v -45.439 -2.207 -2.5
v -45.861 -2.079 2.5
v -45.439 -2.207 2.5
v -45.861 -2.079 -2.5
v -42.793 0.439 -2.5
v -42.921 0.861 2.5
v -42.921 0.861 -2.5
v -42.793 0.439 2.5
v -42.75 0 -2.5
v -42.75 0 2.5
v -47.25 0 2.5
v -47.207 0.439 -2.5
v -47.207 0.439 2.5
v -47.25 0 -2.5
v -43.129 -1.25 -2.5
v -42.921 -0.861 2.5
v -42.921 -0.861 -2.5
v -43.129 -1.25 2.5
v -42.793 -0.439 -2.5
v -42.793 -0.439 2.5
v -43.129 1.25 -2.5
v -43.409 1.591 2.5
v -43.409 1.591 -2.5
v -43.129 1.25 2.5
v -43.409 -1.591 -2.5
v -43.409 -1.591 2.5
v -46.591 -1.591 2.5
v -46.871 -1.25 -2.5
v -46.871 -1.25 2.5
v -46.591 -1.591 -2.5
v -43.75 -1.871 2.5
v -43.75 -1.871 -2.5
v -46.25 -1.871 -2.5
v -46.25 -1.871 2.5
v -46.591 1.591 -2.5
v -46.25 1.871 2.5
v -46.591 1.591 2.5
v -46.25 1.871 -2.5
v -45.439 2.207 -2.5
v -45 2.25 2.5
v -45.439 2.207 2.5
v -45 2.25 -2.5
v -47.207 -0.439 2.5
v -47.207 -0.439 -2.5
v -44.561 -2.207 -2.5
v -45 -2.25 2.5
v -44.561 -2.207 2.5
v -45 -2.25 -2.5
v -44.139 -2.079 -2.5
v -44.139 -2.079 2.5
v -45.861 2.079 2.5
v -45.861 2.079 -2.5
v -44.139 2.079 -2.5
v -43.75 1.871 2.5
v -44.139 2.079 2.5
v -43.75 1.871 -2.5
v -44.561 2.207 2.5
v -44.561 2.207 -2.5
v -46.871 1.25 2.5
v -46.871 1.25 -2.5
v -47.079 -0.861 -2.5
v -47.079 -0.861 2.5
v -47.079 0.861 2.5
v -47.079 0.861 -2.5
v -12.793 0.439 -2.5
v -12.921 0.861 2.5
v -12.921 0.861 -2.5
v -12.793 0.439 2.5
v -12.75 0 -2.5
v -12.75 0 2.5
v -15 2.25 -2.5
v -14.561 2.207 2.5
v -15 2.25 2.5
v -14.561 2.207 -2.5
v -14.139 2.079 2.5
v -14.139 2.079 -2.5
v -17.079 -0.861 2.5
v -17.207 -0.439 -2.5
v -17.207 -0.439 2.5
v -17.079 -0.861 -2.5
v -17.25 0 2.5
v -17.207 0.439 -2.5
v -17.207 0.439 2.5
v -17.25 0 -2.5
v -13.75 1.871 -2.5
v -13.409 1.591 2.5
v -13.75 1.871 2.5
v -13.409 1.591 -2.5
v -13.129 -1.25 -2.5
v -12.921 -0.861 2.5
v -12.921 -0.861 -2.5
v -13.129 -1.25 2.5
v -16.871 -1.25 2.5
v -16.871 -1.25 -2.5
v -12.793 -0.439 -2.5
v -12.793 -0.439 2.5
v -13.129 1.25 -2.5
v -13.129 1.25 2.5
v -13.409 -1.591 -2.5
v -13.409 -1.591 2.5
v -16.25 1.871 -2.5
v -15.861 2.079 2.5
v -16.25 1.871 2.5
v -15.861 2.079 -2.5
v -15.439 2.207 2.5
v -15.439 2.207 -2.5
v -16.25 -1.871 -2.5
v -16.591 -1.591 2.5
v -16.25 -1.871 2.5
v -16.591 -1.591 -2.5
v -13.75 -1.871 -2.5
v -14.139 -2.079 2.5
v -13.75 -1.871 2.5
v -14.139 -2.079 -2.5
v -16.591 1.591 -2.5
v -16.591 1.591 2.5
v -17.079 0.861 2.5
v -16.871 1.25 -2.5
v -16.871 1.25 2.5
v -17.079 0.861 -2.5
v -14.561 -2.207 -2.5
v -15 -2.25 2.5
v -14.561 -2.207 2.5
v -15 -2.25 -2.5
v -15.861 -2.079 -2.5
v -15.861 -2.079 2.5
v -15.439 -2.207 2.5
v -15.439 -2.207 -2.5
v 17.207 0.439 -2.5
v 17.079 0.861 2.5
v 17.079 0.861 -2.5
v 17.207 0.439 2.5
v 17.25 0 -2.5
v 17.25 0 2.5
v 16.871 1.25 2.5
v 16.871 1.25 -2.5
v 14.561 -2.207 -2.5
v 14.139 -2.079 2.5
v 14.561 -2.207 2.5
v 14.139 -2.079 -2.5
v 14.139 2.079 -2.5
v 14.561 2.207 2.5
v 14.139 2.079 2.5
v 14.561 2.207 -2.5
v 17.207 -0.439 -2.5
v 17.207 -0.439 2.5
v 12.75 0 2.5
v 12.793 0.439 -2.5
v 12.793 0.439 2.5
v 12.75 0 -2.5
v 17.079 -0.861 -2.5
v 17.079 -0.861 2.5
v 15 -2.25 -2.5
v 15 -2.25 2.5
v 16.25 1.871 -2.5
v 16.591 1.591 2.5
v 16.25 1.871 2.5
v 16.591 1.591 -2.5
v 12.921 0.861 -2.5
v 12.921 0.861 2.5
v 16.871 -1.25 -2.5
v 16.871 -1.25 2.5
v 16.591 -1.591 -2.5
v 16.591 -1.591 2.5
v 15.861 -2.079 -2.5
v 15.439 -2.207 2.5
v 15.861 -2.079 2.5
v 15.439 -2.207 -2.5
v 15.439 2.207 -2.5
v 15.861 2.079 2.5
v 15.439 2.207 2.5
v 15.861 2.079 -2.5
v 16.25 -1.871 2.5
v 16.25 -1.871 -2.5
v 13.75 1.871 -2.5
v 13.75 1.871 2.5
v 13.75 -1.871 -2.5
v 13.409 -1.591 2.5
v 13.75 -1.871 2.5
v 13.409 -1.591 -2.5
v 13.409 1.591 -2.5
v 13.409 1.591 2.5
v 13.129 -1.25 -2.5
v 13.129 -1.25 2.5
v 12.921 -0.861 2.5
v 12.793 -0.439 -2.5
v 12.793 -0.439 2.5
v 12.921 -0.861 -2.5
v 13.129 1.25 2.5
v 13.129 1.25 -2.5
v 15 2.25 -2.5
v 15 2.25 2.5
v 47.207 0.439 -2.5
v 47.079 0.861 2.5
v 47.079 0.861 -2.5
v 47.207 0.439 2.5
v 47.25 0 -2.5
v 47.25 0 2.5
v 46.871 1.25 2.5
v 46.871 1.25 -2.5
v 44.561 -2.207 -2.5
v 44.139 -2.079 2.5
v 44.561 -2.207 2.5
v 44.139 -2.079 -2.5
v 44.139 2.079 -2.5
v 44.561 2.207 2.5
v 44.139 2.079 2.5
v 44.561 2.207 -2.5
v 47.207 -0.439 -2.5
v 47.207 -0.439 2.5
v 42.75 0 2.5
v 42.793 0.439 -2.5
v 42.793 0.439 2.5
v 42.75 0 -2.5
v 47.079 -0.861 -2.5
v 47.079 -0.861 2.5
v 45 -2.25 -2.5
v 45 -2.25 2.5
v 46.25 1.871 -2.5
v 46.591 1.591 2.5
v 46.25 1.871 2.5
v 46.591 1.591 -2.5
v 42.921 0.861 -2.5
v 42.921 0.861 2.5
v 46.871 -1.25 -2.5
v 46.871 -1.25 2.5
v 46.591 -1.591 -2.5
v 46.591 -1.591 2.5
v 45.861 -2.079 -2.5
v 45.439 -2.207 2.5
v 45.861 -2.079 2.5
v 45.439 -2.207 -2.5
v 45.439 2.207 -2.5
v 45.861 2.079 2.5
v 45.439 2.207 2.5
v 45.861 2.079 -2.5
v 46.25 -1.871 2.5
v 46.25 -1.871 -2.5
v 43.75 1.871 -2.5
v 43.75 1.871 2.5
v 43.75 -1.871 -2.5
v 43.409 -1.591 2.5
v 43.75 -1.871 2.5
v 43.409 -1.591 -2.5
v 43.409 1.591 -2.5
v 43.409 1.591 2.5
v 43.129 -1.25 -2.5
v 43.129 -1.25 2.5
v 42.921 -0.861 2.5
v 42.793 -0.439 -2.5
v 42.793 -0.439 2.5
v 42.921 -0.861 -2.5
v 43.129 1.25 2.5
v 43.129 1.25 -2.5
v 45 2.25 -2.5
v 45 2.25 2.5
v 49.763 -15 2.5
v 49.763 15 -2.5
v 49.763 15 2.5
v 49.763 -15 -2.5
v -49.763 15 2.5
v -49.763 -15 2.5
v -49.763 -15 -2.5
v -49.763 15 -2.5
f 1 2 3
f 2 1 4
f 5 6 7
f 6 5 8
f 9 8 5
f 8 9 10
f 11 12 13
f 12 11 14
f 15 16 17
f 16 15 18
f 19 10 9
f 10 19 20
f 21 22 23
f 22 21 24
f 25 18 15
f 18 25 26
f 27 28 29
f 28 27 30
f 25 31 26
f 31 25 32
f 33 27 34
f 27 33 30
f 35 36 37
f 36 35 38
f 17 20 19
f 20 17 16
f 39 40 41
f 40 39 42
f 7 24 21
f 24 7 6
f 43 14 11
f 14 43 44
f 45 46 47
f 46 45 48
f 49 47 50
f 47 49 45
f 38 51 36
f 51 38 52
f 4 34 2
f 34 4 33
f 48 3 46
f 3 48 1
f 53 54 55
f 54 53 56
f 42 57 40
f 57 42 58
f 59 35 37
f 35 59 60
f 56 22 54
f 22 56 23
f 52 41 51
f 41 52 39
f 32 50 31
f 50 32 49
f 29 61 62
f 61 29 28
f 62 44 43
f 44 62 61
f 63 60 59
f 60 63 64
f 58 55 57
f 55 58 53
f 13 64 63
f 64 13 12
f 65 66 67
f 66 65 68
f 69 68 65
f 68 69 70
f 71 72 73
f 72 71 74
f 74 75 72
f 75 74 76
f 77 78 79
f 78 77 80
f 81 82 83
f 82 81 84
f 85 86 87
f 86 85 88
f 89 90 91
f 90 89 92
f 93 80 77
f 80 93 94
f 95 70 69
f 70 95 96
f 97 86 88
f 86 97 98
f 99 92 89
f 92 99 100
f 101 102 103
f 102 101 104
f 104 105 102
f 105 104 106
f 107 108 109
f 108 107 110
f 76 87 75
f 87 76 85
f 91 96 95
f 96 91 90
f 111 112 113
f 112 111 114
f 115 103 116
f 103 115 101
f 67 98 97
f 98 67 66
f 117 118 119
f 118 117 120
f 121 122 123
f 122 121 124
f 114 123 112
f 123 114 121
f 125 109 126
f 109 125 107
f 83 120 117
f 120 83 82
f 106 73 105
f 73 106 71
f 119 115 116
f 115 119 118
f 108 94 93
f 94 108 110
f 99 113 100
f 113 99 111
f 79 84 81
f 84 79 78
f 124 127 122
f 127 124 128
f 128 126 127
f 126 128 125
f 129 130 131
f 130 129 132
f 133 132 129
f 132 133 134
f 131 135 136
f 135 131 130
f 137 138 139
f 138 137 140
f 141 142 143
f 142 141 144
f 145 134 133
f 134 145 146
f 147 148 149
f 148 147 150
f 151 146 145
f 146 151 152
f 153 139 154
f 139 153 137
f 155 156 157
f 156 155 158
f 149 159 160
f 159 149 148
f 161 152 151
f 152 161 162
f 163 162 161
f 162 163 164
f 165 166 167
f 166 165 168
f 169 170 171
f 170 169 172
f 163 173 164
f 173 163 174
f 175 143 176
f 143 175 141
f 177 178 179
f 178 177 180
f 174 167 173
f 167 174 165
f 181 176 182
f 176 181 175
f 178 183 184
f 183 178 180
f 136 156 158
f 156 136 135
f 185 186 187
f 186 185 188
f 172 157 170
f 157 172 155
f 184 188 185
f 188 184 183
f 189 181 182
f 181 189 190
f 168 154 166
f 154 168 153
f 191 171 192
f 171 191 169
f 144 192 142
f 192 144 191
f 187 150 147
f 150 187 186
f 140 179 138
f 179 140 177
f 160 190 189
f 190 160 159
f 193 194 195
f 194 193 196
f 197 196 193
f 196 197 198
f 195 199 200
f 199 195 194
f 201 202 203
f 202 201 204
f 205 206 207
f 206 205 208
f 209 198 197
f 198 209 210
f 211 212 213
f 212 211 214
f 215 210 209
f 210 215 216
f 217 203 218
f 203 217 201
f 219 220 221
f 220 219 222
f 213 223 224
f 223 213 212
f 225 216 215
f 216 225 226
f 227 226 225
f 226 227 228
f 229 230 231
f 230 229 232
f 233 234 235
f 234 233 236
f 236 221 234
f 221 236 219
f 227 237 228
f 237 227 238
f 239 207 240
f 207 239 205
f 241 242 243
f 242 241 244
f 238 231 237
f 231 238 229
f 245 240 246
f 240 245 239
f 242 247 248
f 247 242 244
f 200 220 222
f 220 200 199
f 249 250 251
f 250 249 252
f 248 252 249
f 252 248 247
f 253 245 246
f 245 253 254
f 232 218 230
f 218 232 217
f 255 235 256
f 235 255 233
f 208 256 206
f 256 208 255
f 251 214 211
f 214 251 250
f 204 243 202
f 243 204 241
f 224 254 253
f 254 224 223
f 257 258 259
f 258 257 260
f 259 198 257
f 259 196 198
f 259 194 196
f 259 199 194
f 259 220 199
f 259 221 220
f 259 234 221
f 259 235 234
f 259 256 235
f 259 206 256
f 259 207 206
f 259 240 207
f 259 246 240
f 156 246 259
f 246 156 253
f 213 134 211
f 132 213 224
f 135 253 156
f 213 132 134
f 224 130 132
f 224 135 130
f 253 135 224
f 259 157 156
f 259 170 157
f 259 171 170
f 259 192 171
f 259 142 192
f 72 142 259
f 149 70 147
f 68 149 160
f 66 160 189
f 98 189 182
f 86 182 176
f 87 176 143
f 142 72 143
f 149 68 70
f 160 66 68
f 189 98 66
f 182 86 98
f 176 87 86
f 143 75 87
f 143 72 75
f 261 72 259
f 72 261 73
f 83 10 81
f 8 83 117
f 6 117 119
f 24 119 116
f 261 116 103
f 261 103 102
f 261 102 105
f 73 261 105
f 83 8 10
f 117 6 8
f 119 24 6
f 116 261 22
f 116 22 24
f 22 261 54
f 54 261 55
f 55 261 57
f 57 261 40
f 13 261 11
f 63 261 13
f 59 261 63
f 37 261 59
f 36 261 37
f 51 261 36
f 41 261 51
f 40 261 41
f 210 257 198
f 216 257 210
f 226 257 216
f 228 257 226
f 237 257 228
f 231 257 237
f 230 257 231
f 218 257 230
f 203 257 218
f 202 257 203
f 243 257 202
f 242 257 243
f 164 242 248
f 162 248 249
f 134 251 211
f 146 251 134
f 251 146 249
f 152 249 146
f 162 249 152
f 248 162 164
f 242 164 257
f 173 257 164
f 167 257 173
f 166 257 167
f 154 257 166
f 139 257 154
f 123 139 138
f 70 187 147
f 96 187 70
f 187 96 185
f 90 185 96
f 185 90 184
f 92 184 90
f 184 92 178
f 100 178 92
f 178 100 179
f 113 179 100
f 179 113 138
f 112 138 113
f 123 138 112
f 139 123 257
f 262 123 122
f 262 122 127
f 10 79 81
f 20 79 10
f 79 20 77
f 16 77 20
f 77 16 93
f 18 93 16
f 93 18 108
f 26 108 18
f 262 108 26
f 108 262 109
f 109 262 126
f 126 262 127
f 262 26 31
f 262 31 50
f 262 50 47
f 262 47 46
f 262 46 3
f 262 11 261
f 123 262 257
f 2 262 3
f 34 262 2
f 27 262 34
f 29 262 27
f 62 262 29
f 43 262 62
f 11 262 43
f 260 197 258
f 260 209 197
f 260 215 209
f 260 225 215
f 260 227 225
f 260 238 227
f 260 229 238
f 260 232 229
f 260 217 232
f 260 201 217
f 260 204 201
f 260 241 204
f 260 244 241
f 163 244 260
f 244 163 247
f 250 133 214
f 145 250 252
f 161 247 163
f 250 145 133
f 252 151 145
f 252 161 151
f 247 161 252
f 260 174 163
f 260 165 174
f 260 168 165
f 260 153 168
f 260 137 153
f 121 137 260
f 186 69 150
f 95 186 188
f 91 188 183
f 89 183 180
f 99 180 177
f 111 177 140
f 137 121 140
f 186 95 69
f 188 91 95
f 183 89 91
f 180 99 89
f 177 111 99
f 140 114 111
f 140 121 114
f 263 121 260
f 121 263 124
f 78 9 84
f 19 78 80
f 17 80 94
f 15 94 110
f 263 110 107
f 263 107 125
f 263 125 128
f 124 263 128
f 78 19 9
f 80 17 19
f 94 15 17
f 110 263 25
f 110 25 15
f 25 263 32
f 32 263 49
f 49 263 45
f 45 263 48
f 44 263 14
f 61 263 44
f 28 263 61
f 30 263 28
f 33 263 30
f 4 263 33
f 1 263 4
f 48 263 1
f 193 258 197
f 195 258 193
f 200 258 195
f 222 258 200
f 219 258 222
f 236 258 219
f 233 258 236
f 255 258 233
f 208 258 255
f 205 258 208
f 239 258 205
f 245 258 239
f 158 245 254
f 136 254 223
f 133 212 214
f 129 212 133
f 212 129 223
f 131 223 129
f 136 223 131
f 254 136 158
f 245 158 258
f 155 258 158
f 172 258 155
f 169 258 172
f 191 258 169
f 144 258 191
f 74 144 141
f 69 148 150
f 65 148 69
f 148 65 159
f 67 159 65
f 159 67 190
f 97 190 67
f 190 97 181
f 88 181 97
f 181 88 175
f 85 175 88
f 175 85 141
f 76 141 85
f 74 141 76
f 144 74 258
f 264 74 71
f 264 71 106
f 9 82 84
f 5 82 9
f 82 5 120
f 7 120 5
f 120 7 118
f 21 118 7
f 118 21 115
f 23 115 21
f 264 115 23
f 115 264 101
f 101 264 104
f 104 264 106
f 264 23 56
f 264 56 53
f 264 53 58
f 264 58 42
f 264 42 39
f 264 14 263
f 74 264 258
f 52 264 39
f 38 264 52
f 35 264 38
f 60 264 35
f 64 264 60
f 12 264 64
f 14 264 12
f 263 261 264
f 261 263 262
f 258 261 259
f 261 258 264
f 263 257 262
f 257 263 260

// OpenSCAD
$fn = 32;

// ----------------------------------------------------------------------
// Hole bar, 4 x Ø4.5
// skip layout, 4.7625 mm edge offset
// ----------------------------------------------------------------------

// --- parameters (mm) ---
bar_w = 30;       // bar width (Y)
bar_t = 5;        // bar thickness (Z)
holes = 4;        // holes per row
hole_d = 4.5;     // hole diameter
edge = 4.763;     // offset from the bar end to the first hole
grid_pitch = 15;  // grid the bar was laid out on

// --- derived feature positions (mm) ---
pitch = grid_pitch * 2;       // = 30   holes sit every other grid slot
span = (holes - 1) * pitch;   // = 90   distance between the end holes
bar_l = span + 2 * edge;      // = 99.53   overall bar length
start_x = -bar_l / 2 + edge;  // = -45   X of the first hole
feature_centers = [
  [start_x + 0 * pitch, 0],
  [start_x + 1 * pitch, 0],
  [start_x + 2 * pitch, 0],
  [start_x + 3 * pitch, 0]
];   // hole centres of the first row

// bar with one row of holes, drilled from feature_centers
difference() {
  translate([-bar_l / 2, -bar_w / 2, -bar_t / 2]) cube([bar_l, bar_w, bar_t]);
  for (centre = feature_centers)
    translate([centre[0], centre[1], 0])
      cylinder(d = hole_d, h = bar_t + 2, center = true);
}
